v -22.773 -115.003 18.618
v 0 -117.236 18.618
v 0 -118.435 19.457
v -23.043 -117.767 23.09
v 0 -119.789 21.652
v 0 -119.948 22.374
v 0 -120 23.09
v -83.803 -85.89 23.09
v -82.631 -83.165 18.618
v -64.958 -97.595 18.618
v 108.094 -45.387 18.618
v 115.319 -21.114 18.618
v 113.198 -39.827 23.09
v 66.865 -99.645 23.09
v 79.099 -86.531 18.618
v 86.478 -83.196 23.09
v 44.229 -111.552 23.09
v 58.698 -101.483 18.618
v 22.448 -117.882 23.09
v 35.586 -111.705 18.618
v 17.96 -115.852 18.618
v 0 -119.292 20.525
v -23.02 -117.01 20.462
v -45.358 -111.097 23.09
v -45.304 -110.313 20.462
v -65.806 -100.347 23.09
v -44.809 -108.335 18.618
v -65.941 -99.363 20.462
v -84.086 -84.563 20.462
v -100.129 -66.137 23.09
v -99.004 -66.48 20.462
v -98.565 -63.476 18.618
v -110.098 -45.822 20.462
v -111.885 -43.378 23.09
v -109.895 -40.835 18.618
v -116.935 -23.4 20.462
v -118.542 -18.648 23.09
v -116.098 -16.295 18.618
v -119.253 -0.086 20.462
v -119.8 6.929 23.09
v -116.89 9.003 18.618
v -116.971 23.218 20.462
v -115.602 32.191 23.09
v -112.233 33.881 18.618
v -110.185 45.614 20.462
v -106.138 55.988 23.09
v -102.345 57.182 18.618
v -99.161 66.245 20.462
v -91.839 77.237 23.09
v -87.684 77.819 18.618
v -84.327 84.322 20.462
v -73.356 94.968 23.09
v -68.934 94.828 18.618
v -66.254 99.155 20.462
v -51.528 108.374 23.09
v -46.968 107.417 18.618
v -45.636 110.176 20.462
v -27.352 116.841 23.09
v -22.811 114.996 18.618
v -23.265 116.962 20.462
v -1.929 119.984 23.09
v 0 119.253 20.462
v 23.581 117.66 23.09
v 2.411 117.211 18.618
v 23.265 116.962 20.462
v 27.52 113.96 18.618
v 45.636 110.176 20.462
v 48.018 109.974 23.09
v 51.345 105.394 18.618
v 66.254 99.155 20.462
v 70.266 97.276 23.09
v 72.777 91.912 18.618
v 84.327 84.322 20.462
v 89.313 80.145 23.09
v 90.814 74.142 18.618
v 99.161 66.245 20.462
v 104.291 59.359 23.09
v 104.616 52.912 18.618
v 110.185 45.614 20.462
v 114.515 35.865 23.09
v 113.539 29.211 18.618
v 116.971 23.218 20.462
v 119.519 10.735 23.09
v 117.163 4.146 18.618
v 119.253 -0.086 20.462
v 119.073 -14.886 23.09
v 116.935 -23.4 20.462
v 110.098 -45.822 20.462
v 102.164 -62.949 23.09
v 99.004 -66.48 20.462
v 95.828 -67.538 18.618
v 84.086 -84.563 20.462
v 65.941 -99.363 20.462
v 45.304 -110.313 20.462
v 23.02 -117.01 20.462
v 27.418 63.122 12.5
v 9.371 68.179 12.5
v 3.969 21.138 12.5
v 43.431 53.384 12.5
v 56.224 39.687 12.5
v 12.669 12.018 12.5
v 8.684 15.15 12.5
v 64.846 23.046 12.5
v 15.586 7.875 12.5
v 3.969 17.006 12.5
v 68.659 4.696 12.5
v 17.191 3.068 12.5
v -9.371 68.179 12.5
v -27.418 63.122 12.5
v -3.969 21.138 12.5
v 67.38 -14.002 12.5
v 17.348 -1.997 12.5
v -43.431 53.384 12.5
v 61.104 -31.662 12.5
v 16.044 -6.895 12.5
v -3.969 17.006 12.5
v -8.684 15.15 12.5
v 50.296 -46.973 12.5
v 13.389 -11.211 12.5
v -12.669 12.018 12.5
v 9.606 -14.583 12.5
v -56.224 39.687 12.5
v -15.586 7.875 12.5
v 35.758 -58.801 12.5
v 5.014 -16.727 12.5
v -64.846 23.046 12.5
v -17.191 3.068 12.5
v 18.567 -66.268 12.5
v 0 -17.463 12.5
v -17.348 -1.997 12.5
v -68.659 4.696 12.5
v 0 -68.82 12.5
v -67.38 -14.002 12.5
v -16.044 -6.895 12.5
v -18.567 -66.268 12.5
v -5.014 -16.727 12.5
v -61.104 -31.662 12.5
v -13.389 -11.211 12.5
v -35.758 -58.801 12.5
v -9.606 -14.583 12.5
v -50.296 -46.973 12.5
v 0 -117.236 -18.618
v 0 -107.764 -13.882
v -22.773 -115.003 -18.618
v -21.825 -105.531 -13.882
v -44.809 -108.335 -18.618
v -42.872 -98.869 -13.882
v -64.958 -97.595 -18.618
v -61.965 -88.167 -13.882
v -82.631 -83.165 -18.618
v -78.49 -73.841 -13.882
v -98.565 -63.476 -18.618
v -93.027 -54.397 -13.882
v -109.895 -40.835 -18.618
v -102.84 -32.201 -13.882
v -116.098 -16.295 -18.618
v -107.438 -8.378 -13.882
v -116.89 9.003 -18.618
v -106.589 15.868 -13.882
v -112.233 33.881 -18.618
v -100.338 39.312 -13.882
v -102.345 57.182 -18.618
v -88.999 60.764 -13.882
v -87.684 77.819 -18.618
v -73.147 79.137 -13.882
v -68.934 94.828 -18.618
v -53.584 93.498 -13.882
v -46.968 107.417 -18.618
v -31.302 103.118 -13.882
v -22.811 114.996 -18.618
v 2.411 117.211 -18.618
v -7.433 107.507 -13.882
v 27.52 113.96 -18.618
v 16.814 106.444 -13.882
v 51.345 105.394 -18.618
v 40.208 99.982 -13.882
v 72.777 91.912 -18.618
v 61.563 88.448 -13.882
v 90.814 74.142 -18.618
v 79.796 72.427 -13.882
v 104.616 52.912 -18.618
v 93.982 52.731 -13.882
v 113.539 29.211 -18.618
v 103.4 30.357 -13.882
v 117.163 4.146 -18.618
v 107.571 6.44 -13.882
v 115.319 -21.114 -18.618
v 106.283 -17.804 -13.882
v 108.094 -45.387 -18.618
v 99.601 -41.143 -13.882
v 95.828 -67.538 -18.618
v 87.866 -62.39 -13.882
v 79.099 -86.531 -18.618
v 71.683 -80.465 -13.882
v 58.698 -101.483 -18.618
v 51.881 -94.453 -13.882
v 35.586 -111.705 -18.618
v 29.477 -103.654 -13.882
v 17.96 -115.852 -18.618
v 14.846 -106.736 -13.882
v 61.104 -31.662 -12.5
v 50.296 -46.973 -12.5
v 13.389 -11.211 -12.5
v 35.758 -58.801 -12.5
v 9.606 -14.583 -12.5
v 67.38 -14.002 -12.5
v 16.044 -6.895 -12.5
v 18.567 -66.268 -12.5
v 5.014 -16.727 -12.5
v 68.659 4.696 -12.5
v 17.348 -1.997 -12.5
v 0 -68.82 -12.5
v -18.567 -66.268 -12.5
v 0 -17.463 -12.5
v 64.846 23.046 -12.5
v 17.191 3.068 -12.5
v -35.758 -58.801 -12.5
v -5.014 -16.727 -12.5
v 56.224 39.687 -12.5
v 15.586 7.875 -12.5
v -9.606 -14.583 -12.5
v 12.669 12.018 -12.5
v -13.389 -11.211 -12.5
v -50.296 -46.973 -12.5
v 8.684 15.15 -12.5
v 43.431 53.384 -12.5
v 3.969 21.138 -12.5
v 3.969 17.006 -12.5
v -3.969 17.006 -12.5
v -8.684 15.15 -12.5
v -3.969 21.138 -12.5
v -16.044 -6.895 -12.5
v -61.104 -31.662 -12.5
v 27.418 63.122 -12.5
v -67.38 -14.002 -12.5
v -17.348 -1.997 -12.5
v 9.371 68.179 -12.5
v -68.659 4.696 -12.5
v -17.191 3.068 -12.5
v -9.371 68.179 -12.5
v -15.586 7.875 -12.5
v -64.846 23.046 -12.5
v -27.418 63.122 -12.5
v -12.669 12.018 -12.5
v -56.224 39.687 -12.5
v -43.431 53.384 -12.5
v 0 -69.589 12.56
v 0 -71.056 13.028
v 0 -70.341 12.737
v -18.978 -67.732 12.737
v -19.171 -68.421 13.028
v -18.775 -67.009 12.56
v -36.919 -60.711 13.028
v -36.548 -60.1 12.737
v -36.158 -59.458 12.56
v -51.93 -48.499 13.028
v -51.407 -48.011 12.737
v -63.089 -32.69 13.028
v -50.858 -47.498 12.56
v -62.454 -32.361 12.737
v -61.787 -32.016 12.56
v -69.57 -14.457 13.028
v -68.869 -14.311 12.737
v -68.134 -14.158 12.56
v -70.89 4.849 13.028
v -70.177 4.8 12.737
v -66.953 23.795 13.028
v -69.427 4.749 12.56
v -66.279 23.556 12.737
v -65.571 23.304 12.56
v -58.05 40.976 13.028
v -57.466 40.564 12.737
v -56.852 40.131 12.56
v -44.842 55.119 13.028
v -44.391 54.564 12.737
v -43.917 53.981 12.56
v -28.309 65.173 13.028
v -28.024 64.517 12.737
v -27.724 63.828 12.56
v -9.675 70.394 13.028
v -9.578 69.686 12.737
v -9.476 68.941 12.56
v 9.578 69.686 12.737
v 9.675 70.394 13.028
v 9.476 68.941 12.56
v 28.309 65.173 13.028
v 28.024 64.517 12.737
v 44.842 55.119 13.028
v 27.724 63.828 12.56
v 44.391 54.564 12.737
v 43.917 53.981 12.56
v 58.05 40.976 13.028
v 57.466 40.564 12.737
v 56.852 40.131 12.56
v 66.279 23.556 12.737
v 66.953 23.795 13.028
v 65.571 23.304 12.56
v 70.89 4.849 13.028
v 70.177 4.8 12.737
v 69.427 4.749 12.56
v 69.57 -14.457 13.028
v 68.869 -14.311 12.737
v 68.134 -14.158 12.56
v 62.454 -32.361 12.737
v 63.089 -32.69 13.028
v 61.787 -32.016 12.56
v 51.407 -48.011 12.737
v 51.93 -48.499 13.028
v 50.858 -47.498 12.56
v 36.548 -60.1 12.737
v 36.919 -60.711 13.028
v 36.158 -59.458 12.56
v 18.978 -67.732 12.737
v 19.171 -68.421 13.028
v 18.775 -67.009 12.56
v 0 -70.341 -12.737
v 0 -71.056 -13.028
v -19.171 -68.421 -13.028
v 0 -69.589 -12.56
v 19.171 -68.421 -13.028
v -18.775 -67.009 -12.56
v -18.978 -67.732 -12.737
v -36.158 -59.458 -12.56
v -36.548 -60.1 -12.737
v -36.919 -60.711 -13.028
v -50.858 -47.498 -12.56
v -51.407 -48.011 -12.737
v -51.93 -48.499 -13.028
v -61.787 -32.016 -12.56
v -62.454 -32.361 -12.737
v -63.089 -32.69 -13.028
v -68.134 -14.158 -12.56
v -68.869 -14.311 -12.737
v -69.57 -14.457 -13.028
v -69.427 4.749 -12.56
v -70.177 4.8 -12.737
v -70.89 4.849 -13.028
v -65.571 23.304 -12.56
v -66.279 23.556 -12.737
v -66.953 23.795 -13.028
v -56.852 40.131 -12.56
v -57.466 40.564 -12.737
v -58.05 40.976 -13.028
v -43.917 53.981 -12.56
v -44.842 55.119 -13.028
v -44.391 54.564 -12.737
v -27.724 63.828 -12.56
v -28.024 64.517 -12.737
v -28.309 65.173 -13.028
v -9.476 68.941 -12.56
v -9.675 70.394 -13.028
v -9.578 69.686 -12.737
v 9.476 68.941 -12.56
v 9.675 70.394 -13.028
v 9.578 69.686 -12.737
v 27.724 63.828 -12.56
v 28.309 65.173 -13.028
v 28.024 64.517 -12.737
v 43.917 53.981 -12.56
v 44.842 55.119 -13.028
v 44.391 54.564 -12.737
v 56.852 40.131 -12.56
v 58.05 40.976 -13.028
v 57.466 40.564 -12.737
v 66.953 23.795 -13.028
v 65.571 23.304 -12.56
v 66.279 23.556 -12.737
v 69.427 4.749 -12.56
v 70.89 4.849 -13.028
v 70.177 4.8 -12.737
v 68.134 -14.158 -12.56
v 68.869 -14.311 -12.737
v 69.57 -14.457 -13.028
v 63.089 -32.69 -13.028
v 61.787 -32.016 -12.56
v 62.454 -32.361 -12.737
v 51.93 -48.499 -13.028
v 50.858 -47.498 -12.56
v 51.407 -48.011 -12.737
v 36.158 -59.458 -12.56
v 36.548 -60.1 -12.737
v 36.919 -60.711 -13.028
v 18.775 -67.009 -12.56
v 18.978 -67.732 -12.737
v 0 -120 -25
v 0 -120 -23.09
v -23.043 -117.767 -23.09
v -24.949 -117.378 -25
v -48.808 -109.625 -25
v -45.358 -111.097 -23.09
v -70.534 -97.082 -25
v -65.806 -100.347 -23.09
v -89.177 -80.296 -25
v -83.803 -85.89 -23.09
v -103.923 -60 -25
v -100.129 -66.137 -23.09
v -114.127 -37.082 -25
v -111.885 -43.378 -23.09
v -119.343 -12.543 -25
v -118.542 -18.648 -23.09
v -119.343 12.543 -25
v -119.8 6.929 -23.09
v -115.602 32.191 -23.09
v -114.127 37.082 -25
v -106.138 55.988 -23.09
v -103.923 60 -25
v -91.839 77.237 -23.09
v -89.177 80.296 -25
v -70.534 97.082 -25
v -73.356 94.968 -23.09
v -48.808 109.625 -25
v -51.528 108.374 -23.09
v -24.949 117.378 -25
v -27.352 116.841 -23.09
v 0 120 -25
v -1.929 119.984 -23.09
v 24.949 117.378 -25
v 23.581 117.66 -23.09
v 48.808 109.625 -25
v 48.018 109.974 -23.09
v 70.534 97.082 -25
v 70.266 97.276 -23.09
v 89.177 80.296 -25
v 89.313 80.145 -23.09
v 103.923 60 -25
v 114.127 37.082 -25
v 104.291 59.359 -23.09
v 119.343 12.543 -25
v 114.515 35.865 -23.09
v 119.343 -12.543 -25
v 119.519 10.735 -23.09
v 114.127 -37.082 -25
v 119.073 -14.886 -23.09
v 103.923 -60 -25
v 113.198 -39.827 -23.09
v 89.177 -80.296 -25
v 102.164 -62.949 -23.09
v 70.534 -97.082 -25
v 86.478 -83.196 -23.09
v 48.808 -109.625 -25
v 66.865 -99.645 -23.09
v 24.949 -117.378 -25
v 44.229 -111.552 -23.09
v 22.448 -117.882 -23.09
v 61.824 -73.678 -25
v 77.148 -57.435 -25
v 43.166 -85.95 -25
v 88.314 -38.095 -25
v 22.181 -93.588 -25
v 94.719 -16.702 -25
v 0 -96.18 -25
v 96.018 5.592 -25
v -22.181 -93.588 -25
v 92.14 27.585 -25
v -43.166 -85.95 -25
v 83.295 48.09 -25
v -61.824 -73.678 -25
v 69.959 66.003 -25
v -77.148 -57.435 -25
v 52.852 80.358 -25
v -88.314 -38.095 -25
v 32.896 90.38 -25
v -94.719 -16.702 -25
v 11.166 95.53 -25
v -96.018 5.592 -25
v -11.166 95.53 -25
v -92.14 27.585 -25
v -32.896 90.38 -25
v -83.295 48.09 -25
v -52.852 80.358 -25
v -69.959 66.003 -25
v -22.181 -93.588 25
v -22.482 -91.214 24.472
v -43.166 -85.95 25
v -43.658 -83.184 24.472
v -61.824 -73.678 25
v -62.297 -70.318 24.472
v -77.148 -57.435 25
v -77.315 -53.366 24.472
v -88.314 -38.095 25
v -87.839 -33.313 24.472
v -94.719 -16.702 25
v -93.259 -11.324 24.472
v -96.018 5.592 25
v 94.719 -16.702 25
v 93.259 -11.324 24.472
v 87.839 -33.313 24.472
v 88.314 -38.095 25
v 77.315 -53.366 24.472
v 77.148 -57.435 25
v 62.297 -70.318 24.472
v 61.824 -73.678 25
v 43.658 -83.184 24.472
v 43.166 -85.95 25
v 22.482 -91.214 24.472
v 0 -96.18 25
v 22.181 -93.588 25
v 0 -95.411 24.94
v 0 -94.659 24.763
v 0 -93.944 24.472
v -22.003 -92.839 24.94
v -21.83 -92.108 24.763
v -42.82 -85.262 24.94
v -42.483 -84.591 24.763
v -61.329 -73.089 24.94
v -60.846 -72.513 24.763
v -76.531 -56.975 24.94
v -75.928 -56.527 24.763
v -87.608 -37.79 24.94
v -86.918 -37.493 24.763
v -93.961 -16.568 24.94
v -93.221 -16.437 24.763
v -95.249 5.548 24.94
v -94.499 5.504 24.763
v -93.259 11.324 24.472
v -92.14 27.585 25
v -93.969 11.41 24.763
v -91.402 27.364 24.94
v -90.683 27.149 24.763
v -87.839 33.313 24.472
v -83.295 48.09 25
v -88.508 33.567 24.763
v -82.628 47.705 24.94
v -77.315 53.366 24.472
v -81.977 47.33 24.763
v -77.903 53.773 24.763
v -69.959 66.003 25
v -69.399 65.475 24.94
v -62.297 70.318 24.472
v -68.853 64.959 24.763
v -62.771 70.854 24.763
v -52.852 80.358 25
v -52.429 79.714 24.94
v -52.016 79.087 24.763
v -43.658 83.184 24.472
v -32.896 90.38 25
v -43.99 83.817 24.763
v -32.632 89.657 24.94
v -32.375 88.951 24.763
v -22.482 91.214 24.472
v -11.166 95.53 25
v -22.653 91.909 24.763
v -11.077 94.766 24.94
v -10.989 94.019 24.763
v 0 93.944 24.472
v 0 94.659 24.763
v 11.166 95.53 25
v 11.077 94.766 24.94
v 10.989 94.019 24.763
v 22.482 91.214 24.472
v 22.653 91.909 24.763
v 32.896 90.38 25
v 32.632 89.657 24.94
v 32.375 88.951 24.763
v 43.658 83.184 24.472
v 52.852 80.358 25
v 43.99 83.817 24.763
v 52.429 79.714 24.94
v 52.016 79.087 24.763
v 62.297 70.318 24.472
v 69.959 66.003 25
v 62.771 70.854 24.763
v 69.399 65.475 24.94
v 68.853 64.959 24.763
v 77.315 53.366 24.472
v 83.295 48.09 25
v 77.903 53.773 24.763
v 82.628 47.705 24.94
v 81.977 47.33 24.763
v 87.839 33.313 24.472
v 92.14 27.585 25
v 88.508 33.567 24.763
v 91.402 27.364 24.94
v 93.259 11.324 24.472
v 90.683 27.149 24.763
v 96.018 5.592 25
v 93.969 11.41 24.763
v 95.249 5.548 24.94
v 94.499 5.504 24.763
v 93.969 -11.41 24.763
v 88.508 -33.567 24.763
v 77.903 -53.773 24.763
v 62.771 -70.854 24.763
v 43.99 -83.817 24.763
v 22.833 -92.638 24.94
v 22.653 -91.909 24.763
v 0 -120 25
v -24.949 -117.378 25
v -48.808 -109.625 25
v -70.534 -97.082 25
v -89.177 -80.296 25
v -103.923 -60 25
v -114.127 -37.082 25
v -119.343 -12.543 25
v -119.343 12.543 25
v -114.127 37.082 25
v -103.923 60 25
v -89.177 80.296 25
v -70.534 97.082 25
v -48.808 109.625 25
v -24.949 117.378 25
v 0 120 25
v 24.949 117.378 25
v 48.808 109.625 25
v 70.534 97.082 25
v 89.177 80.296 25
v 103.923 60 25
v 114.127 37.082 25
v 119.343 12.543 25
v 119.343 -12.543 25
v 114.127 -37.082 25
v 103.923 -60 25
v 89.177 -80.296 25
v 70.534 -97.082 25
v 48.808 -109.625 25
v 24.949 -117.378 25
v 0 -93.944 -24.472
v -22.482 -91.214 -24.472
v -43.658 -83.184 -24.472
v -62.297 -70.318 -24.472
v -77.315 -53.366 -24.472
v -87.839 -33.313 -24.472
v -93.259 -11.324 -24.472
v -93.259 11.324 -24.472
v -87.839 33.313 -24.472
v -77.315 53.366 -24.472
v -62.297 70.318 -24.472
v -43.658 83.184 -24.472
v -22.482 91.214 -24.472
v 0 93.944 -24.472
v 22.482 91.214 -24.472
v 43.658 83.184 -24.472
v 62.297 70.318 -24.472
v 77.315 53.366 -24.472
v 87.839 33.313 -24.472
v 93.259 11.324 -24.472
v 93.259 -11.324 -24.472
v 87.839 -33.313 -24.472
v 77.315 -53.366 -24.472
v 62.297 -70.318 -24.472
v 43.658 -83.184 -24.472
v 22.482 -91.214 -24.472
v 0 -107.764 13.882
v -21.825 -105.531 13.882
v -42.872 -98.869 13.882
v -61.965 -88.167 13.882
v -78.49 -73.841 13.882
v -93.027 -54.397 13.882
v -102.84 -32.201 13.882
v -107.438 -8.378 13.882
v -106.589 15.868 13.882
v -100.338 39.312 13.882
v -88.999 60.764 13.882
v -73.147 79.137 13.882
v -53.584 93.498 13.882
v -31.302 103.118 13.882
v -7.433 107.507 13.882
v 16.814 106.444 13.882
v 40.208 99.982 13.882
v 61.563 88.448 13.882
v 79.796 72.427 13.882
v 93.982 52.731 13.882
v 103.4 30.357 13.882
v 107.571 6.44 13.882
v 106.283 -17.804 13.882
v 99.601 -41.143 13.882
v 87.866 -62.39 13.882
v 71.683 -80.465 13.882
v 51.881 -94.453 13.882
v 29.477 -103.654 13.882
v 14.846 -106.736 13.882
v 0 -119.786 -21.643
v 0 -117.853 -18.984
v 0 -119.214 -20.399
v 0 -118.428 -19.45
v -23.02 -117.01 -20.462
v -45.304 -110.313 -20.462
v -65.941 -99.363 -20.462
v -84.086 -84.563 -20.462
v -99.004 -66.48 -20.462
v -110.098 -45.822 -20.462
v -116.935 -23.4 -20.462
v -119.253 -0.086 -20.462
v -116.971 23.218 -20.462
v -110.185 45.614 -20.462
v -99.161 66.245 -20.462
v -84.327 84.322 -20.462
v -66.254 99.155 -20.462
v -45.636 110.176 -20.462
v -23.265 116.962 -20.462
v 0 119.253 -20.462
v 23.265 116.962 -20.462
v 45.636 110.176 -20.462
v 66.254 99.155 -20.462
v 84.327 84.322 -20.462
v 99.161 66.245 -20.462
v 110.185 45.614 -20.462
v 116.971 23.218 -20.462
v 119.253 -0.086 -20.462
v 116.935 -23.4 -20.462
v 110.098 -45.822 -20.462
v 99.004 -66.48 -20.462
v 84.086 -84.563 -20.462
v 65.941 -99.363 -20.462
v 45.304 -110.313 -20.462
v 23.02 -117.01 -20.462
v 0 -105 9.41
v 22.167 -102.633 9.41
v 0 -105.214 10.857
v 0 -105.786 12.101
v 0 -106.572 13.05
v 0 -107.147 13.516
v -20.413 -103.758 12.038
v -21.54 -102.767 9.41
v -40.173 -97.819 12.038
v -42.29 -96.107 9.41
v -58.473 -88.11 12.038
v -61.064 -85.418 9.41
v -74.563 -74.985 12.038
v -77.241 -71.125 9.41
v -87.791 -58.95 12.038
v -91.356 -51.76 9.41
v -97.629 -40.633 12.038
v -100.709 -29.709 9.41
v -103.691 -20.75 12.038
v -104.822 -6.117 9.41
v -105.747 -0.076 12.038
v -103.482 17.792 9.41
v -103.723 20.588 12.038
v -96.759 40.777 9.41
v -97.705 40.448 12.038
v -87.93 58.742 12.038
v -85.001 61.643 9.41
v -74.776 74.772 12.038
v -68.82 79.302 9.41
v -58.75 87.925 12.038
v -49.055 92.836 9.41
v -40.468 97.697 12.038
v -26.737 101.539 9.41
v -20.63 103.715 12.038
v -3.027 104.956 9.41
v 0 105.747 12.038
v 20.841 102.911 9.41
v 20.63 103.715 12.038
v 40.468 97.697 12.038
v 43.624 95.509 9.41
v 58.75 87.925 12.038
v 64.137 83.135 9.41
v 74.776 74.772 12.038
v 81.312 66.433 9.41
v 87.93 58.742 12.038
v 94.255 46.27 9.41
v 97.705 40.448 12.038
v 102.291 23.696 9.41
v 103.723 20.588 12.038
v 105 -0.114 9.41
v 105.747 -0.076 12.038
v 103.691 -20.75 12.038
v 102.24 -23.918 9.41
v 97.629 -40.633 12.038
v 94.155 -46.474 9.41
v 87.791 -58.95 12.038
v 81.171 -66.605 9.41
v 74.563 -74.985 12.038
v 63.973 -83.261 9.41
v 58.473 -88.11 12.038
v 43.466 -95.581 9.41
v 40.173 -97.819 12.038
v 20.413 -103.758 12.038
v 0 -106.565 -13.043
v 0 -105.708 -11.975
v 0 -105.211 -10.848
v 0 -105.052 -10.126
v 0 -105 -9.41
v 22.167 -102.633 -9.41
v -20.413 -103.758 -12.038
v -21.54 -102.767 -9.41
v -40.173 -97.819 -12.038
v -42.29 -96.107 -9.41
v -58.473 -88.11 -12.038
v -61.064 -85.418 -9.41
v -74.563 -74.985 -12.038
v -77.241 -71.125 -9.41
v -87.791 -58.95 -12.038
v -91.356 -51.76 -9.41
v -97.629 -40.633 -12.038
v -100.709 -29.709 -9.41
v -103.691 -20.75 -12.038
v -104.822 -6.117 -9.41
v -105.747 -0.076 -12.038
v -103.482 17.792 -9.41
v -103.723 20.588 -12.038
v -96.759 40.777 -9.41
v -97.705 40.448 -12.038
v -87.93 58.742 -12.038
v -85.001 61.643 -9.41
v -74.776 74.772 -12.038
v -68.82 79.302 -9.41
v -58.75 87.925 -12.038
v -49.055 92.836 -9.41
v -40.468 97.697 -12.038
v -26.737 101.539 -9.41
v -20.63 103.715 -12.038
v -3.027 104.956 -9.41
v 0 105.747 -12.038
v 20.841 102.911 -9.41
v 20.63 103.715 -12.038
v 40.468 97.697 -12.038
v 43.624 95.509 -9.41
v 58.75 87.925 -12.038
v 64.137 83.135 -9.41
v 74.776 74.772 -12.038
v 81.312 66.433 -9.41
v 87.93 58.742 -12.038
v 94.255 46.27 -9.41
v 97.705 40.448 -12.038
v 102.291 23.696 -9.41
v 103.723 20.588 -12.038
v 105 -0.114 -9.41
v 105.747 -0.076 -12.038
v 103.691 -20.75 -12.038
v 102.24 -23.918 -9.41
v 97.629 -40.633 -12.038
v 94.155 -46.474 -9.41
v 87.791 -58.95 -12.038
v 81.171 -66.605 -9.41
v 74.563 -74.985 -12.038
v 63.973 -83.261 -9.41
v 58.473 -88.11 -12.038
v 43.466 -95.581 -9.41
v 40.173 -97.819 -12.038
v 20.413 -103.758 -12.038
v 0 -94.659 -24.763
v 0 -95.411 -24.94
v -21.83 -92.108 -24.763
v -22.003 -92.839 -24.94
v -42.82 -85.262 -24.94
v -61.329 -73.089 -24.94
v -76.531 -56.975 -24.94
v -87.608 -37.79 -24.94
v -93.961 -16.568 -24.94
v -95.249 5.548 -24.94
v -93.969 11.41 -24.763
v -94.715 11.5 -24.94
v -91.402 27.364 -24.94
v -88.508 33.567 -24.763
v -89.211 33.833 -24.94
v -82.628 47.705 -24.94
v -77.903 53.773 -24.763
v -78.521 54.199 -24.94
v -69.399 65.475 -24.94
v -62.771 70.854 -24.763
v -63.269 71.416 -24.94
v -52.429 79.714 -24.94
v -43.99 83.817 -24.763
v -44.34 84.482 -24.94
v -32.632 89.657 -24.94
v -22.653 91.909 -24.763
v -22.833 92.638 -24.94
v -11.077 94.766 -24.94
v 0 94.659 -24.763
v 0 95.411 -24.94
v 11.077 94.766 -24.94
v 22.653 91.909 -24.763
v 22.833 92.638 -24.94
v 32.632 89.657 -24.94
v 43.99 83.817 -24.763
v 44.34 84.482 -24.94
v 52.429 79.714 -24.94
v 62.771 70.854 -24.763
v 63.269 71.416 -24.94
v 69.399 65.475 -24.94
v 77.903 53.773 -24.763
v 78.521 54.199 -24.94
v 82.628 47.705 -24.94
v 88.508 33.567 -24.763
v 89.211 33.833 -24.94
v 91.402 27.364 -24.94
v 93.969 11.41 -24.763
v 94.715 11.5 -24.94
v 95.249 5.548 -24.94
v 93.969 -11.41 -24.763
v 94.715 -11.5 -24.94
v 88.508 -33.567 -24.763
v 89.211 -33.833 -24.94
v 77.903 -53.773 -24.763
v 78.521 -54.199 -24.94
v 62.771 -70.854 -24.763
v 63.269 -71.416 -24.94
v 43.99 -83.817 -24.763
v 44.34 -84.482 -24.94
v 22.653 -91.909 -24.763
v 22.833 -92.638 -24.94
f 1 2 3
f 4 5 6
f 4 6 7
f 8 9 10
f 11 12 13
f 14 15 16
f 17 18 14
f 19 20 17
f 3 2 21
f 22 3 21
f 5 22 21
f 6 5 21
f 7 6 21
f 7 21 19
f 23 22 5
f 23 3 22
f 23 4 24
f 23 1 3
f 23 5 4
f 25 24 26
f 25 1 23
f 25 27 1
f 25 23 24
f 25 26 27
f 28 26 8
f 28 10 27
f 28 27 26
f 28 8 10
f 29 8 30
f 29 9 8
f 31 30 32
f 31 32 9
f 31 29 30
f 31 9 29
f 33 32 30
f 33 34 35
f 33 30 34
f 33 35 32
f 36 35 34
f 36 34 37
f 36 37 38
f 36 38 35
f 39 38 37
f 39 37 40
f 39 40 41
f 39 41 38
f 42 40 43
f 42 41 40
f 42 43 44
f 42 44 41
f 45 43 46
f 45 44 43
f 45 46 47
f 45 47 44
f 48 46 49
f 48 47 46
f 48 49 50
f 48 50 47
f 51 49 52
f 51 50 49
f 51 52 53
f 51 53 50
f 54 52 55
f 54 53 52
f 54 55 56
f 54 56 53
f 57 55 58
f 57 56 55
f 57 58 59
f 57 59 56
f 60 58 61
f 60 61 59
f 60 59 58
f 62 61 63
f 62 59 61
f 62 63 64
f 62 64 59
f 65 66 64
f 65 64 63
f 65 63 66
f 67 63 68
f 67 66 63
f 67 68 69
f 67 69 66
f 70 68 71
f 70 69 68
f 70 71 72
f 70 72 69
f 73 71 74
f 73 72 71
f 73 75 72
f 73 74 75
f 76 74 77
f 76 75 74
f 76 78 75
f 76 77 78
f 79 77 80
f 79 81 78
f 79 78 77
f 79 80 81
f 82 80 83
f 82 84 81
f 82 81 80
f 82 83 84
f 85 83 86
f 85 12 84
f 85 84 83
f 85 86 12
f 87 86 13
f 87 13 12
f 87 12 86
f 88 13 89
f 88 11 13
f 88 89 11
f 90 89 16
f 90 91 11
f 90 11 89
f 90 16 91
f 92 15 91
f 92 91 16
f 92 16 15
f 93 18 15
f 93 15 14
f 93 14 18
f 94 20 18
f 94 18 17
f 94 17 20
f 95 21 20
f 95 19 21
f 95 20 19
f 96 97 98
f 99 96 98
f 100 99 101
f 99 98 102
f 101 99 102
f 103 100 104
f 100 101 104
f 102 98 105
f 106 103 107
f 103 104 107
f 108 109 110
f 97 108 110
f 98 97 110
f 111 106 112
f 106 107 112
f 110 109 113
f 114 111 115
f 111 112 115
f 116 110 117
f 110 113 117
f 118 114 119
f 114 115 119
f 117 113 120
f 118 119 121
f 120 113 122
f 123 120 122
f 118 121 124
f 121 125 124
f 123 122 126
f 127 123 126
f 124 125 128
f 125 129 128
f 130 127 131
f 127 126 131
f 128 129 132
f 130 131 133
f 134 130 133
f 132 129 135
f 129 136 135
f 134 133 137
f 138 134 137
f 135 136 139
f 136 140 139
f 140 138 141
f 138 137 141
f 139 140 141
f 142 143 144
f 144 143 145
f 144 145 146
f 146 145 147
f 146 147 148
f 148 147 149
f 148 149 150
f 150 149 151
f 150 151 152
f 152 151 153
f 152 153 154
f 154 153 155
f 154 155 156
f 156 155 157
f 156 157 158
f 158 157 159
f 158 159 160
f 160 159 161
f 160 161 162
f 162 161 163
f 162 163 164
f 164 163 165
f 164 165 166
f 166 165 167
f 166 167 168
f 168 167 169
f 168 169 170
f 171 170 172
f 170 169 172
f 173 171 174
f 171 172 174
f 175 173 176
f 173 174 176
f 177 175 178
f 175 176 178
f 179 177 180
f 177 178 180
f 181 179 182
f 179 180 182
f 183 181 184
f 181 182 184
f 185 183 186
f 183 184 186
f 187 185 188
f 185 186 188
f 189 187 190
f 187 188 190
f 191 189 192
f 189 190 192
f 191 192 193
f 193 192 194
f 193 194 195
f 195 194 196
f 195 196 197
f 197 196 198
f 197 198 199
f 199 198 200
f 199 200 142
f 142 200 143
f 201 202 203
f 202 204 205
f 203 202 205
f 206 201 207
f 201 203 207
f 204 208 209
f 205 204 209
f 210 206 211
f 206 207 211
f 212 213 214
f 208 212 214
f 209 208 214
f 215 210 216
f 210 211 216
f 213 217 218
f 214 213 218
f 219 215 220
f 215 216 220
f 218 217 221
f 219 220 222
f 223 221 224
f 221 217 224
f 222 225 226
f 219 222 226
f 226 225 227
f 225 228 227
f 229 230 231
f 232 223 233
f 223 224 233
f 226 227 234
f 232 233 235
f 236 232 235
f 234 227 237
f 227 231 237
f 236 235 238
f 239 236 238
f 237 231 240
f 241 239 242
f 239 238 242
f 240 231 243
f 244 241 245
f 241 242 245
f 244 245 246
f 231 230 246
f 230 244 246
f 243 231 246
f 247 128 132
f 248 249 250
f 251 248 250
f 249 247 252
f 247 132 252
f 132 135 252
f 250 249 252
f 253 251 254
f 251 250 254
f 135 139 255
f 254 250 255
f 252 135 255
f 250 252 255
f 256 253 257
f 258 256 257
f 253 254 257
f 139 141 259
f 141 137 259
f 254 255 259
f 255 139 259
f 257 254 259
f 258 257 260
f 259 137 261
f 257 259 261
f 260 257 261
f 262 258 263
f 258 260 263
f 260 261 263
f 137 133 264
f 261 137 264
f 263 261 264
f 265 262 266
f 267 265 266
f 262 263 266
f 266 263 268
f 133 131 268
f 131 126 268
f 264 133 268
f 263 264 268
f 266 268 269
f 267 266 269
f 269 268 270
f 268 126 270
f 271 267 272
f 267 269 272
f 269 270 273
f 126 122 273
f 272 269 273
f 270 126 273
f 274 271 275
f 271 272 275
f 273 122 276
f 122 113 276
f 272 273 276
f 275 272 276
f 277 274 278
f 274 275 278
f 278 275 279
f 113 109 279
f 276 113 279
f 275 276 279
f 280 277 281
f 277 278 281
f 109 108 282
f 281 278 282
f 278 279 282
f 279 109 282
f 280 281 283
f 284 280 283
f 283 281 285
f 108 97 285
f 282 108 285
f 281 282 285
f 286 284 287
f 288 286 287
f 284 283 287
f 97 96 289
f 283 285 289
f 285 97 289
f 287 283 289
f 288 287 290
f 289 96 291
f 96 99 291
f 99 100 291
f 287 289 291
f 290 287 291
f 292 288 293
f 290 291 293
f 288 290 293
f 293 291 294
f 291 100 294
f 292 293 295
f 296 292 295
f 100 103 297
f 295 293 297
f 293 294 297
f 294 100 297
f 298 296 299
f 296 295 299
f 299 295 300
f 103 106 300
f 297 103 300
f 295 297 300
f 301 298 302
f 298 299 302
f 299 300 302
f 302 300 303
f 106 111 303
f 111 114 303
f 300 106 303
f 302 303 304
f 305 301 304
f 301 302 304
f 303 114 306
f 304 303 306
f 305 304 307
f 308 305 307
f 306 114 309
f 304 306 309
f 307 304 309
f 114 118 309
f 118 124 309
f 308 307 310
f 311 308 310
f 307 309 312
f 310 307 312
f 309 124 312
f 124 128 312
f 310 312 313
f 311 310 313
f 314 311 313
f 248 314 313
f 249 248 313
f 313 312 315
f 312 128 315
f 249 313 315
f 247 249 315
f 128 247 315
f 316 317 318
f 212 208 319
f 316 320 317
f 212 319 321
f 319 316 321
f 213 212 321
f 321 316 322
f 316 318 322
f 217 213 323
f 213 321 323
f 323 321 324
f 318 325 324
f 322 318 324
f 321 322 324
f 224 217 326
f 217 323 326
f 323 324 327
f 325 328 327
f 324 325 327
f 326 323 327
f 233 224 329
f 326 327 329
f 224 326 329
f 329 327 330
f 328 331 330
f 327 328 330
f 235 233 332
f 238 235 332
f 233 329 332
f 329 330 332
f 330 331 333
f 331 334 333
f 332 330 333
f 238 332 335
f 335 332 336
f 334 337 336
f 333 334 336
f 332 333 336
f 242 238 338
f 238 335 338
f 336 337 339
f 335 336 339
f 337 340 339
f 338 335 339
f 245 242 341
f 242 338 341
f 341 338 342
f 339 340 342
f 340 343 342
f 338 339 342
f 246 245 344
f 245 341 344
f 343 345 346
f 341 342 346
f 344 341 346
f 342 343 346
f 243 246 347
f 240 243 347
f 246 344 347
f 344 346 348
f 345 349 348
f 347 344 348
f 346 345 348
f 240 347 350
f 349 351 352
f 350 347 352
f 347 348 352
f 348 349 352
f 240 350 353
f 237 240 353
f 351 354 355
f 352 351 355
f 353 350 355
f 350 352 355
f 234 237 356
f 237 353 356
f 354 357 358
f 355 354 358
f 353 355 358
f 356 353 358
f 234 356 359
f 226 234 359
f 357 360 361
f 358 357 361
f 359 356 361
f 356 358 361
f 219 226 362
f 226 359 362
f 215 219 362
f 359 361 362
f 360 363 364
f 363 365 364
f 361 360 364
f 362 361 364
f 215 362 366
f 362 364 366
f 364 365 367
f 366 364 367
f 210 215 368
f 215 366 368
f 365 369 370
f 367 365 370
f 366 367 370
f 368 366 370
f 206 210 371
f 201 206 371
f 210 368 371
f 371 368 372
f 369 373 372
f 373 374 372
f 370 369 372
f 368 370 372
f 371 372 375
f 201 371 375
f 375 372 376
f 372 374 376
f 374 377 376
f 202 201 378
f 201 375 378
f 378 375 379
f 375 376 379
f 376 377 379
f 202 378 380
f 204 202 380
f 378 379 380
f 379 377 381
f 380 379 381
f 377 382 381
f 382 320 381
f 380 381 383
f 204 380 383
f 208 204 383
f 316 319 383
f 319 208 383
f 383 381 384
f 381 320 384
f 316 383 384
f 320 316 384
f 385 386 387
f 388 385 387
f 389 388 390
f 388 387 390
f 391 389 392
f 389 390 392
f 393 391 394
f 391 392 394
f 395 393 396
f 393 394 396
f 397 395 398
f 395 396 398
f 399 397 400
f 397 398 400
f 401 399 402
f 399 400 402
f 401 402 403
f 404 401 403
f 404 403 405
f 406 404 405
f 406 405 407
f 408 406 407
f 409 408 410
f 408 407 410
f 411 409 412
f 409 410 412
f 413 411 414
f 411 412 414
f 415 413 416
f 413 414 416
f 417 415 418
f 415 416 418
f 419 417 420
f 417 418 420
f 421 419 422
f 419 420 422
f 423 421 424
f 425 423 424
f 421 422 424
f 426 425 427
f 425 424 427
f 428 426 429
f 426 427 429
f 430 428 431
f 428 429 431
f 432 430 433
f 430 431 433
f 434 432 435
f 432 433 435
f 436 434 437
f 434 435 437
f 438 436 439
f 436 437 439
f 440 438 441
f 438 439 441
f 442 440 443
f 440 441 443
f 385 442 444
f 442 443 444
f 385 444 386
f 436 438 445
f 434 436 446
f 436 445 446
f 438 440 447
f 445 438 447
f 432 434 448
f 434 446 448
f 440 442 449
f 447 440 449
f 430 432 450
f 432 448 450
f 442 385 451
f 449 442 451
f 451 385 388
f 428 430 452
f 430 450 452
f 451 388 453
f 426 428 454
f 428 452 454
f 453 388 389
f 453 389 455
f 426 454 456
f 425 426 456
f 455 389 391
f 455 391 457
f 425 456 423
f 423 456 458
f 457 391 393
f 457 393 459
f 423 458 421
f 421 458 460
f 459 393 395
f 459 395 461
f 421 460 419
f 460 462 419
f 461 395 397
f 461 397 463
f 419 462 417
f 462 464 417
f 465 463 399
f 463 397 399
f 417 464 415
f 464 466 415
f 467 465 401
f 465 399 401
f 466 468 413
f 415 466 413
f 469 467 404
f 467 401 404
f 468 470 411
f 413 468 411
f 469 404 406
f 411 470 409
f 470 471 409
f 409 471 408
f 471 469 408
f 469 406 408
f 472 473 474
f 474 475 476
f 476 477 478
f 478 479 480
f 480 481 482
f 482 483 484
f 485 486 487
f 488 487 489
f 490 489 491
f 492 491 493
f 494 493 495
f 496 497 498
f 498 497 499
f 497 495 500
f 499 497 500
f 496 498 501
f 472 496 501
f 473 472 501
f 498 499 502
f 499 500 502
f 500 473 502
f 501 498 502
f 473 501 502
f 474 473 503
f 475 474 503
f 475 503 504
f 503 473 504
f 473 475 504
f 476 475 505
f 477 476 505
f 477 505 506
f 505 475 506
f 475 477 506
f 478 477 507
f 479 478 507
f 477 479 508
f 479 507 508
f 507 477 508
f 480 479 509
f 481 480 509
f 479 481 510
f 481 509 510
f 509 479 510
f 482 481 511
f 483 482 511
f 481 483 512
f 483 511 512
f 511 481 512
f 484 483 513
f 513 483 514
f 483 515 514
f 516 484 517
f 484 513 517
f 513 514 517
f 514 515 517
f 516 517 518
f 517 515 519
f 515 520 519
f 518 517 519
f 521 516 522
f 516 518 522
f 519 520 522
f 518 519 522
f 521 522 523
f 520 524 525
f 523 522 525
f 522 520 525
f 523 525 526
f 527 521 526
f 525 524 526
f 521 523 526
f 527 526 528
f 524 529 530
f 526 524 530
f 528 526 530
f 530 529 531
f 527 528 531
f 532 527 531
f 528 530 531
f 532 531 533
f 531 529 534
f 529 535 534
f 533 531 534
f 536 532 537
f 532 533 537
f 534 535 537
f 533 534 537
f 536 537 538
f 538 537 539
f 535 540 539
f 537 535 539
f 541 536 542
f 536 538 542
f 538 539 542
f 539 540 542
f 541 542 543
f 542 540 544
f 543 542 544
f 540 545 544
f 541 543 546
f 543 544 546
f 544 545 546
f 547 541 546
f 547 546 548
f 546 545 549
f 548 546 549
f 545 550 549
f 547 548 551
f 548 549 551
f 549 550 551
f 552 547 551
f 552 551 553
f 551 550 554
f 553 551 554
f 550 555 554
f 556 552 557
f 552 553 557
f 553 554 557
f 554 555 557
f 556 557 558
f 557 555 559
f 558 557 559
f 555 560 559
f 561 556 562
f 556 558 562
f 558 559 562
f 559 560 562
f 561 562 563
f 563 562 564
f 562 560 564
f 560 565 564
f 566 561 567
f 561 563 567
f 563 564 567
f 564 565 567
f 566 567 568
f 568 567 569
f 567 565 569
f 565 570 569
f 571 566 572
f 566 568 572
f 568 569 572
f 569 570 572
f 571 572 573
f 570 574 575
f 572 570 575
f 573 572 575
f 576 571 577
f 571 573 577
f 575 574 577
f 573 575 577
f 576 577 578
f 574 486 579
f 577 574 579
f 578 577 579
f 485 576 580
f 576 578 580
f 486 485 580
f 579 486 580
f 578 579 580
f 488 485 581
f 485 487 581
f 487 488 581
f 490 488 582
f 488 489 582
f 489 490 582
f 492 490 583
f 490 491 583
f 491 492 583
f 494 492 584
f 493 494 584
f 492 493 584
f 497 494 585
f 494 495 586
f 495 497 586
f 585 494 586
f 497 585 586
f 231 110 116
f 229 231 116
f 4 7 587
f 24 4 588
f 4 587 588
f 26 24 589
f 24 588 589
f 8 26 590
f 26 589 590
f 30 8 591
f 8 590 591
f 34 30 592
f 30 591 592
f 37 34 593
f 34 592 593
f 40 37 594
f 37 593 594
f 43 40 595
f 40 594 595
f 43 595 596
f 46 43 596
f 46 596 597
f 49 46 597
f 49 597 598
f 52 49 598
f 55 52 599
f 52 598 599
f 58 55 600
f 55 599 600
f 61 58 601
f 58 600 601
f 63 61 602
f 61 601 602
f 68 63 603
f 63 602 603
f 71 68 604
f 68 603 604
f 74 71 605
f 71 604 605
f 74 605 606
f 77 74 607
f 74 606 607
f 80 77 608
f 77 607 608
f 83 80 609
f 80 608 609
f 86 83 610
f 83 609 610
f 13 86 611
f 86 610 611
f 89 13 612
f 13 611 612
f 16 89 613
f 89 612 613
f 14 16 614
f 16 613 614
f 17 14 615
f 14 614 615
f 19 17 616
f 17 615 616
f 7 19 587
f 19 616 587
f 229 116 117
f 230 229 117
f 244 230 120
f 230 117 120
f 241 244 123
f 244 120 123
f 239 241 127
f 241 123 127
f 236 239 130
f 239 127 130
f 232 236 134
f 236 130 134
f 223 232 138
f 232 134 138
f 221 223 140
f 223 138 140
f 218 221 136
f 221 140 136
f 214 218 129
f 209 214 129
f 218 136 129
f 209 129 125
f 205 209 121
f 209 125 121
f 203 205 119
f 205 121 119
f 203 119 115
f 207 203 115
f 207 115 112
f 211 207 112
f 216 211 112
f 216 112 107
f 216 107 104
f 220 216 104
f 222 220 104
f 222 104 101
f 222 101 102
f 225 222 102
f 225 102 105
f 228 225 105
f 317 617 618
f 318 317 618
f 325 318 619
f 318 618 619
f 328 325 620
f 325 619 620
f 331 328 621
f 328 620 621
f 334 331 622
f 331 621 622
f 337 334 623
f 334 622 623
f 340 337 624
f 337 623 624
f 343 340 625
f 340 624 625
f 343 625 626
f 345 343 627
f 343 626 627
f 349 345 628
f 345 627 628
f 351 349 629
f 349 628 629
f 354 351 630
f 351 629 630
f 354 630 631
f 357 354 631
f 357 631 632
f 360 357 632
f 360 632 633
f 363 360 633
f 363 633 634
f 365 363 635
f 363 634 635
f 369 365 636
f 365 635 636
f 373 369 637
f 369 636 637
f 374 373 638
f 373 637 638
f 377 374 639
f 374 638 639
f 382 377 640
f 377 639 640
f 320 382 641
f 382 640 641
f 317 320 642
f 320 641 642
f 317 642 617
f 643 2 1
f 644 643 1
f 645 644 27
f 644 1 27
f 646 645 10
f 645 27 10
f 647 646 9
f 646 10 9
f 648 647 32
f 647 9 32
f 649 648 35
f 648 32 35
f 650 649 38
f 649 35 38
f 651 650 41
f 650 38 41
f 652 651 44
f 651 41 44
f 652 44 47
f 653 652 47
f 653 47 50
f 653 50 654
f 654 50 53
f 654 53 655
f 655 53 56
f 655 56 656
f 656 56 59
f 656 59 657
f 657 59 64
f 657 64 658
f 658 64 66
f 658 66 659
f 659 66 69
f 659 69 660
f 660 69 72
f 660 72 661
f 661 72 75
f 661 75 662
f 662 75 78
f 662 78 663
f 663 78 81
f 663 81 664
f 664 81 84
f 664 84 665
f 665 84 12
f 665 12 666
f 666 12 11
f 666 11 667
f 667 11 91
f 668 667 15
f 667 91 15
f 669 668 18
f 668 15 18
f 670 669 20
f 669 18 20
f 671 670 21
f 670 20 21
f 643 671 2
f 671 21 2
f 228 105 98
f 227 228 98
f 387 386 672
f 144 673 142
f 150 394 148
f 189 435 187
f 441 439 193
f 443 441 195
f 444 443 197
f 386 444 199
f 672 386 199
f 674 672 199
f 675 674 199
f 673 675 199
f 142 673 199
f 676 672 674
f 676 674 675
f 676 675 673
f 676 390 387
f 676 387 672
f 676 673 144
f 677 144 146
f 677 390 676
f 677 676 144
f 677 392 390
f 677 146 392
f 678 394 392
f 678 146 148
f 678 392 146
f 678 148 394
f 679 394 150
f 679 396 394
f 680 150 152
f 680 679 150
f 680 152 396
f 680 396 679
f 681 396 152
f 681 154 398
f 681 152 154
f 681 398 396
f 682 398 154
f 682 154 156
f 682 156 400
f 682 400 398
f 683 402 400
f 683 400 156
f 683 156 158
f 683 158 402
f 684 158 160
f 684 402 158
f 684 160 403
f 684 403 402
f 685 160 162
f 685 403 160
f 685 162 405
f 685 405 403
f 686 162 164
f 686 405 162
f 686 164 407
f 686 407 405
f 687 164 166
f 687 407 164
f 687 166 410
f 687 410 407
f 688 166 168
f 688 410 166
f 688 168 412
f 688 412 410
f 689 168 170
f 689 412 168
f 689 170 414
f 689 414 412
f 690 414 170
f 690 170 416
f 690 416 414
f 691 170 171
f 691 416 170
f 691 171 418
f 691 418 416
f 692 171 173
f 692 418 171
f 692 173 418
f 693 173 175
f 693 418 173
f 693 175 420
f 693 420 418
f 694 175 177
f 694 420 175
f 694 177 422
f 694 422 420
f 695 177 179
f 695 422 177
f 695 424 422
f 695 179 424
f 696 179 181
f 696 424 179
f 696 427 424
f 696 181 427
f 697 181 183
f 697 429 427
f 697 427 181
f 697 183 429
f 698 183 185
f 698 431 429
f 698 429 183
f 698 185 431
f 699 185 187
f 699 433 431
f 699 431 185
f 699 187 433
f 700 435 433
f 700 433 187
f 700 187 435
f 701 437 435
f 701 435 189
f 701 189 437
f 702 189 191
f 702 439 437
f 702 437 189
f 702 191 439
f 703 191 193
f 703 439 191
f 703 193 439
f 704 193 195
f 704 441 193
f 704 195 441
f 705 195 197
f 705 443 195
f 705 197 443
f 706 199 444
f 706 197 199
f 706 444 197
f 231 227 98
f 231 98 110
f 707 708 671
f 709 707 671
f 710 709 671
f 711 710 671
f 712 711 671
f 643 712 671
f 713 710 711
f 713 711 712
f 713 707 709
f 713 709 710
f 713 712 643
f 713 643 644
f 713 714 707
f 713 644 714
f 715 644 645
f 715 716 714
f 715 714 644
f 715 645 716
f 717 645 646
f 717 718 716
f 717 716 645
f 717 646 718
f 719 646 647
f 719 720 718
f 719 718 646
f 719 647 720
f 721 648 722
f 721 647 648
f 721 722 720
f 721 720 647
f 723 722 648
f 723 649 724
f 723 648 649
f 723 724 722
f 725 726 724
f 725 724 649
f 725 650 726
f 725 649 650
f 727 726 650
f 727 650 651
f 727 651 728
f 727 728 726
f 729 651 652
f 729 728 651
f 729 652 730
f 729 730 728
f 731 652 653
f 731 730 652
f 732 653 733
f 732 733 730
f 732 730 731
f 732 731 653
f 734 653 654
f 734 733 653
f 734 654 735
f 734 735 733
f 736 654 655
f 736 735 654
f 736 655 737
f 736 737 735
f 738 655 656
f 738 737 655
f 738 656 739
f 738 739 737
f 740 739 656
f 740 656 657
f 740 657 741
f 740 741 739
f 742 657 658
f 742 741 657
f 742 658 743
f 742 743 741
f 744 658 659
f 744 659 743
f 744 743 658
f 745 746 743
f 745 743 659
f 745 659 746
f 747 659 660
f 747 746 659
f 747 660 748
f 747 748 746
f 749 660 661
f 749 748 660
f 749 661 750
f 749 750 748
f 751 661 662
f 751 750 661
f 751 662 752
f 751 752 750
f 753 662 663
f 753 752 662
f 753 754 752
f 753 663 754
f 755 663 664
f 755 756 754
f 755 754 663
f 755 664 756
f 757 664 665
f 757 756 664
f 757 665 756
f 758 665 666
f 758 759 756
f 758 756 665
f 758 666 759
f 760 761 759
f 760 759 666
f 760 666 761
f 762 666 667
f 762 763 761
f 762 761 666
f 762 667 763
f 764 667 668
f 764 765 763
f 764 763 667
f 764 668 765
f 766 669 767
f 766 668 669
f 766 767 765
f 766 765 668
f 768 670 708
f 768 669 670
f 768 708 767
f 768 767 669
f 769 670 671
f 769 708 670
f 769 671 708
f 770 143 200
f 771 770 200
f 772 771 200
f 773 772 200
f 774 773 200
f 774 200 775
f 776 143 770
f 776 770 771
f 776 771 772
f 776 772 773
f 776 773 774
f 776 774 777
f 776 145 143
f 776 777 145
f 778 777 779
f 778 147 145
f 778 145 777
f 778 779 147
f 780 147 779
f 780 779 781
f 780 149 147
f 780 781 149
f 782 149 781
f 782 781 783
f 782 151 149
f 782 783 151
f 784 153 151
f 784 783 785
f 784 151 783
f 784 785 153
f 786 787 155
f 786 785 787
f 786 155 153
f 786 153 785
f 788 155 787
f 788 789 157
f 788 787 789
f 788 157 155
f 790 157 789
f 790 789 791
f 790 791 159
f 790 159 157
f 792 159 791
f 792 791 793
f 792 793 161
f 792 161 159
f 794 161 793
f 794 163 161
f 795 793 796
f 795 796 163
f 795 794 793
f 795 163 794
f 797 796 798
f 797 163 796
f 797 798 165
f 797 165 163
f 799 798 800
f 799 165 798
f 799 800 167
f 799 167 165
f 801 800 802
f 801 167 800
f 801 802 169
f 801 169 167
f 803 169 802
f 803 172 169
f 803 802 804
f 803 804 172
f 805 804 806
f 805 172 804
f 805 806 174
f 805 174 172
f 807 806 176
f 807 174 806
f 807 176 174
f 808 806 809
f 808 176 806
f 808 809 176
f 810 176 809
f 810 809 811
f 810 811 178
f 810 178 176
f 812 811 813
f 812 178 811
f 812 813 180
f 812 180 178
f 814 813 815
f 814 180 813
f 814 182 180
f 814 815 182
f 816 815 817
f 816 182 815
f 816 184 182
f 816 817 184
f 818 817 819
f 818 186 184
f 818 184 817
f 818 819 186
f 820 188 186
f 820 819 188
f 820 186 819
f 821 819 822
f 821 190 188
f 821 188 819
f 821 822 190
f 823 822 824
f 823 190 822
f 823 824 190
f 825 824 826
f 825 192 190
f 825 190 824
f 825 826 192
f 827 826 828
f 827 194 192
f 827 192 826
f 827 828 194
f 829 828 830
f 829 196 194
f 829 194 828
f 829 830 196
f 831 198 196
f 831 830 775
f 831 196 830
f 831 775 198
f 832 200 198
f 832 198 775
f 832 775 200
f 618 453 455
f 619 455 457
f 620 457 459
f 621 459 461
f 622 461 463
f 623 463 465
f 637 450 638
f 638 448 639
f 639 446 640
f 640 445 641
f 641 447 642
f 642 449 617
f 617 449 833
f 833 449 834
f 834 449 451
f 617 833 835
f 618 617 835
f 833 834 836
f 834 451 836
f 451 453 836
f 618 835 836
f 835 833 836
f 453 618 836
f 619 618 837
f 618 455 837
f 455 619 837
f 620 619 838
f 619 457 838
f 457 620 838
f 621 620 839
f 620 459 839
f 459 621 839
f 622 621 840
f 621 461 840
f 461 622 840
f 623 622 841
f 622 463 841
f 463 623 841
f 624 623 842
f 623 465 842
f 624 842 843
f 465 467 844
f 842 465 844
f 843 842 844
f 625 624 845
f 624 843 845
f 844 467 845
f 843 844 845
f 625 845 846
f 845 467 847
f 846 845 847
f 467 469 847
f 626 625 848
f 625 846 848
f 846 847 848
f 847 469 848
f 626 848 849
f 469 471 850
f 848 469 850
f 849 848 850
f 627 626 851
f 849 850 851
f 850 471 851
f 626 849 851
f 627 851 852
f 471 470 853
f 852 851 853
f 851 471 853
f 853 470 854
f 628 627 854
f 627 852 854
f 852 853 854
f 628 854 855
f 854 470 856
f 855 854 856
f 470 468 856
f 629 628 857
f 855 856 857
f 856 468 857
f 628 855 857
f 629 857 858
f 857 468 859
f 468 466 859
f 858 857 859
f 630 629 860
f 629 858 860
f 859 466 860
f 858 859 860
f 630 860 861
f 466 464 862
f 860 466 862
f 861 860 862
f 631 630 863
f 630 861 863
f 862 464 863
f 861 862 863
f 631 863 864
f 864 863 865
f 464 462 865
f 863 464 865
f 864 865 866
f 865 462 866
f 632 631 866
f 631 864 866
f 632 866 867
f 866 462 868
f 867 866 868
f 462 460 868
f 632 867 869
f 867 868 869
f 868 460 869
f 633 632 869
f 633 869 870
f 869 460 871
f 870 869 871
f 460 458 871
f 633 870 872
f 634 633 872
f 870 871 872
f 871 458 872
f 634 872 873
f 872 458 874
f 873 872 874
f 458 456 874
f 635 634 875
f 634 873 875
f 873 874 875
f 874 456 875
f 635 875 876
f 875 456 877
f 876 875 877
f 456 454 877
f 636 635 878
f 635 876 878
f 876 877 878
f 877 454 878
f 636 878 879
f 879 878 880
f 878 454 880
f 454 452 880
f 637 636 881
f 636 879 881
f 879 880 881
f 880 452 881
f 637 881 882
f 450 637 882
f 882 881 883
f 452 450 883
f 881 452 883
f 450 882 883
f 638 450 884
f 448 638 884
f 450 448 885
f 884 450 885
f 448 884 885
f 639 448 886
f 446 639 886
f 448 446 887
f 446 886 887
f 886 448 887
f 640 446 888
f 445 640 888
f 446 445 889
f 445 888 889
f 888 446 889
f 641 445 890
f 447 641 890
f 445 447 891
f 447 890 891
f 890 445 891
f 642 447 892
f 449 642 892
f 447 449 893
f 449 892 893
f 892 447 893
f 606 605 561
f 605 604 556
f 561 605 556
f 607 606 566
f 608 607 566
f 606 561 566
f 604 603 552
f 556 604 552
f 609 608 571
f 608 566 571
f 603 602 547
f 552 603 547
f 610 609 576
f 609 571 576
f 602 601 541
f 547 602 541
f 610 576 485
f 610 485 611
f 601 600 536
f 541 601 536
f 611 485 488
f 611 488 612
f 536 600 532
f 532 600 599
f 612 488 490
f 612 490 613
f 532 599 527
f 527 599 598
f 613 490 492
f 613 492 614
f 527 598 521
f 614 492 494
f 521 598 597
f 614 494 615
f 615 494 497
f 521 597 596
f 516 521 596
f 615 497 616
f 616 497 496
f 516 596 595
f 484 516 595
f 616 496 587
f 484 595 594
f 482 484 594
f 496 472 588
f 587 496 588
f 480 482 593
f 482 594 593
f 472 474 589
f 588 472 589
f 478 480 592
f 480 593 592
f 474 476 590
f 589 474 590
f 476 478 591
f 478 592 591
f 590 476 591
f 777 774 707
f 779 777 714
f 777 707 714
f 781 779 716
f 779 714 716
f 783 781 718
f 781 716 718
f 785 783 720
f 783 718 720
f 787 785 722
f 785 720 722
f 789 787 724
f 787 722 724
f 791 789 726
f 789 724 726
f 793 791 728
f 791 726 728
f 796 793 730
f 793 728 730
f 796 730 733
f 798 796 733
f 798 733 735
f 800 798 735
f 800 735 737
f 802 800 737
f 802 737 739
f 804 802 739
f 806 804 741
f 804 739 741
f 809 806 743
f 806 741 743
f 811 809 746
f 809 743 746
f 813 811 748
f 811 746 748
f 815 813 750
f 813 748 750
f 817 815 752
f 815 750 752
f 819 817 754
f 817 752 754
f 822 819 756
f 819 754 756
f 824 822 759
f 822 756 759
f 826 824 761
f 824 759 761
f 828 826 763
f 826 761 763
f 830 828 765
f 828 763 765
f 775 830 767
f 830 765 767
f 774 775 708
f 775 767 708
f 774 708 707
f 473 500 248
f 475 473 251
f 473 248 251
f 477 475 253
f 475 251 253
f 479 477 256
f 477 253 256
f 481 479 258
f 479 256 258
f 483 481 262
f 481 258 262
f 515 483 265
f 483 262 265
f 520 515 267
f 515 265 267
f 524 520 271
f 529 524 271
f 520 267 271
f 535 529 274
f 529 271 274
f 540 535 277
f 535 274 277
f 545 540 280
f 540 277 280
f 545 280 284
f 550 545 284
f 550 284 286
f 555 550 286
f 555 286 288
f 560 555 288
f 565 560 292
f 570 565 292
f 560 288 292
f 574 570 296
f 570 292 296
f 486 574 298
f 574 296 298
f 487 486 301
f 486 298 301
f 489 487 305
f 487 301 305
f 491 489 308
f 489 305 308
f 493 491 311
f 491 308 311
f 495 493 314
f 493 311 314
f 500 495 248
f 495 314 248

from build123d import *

# Parameters (mm, degrees)
FILLETS_R            = 5
SHAFT_CUT_DEPTH      = 174.799455871
SHAFT_CUT_DEPTH_BACK = 174.799455871


with BuildPart() as part:
    # Sketch1 → Main wheel extrude (revolve)
    with BuildSketch(Plane(origin=(0, 0, 0), x_dir=(0, 0, -1), z_dir=(1, 0, 0)), mode=Mode.PRIVATE) as main_wheel_extrude_sk:
        Polygon((-25, 120), (-25, 95), (-12.5, 70), (-12.5, 0), (12.5, 0), (12.5, 70), (25, 95), (25, 120), (20, 120), (12.5, 105), (-12.5, 105), (-20, 120), align=None)
    revolve(main_wheel_extrude_sk.sketch.rotate(Axis((0, 0, 12.5), (0, 0, -1)), 180), axis=Axis((0, 0, 12.5), (0, 0, -1)))

    # Fillets
    fillets_edges = [part.edges().sort_by_distance(p)[0] for p in [
        (0, 105, -12.5),
        (0, 120, -20),
        (0, 95, -25),
        (0, 70, -12.5),
        (0, 70, 12.5),
        (0, 95, 25),
        (0, 120, 20),
        (0, 105, 12.5),
    ]]
    fillet(fillets_edges, radius=FILLETS_R)

    # Sketch3 → Shaft cut (cut, two sides: drawn at the far end of the back side and taken through both)
    with BuildSketch(Plane(origin=(0, 0, -12.5), x_dir=(-1, 0, 0), z_dir=(0, 0, -1)).offset(-SHAFT_CUT_DEPTH_BACK)):
        with BuildLine():
            Line((-3.96875, 17.005526445), (-3.96875, 21.138106445))
            Line((-3.96875, 21.138106445), (3.96875, 21.138106445))
            Line((3.96875, 21.138106445), (3.96875, 17.005526445))
            ThreePointArc((3.96875, 17.005526445), (0, -17.4625), (-3.96875, 17.005526445))
        make_face()
    extrude(amount=SHAFT_CUT_DEPTH + SHAFT_CUT_DEPTH_BACK, mode=Mode.SUBTRACT)


solid = part.part
